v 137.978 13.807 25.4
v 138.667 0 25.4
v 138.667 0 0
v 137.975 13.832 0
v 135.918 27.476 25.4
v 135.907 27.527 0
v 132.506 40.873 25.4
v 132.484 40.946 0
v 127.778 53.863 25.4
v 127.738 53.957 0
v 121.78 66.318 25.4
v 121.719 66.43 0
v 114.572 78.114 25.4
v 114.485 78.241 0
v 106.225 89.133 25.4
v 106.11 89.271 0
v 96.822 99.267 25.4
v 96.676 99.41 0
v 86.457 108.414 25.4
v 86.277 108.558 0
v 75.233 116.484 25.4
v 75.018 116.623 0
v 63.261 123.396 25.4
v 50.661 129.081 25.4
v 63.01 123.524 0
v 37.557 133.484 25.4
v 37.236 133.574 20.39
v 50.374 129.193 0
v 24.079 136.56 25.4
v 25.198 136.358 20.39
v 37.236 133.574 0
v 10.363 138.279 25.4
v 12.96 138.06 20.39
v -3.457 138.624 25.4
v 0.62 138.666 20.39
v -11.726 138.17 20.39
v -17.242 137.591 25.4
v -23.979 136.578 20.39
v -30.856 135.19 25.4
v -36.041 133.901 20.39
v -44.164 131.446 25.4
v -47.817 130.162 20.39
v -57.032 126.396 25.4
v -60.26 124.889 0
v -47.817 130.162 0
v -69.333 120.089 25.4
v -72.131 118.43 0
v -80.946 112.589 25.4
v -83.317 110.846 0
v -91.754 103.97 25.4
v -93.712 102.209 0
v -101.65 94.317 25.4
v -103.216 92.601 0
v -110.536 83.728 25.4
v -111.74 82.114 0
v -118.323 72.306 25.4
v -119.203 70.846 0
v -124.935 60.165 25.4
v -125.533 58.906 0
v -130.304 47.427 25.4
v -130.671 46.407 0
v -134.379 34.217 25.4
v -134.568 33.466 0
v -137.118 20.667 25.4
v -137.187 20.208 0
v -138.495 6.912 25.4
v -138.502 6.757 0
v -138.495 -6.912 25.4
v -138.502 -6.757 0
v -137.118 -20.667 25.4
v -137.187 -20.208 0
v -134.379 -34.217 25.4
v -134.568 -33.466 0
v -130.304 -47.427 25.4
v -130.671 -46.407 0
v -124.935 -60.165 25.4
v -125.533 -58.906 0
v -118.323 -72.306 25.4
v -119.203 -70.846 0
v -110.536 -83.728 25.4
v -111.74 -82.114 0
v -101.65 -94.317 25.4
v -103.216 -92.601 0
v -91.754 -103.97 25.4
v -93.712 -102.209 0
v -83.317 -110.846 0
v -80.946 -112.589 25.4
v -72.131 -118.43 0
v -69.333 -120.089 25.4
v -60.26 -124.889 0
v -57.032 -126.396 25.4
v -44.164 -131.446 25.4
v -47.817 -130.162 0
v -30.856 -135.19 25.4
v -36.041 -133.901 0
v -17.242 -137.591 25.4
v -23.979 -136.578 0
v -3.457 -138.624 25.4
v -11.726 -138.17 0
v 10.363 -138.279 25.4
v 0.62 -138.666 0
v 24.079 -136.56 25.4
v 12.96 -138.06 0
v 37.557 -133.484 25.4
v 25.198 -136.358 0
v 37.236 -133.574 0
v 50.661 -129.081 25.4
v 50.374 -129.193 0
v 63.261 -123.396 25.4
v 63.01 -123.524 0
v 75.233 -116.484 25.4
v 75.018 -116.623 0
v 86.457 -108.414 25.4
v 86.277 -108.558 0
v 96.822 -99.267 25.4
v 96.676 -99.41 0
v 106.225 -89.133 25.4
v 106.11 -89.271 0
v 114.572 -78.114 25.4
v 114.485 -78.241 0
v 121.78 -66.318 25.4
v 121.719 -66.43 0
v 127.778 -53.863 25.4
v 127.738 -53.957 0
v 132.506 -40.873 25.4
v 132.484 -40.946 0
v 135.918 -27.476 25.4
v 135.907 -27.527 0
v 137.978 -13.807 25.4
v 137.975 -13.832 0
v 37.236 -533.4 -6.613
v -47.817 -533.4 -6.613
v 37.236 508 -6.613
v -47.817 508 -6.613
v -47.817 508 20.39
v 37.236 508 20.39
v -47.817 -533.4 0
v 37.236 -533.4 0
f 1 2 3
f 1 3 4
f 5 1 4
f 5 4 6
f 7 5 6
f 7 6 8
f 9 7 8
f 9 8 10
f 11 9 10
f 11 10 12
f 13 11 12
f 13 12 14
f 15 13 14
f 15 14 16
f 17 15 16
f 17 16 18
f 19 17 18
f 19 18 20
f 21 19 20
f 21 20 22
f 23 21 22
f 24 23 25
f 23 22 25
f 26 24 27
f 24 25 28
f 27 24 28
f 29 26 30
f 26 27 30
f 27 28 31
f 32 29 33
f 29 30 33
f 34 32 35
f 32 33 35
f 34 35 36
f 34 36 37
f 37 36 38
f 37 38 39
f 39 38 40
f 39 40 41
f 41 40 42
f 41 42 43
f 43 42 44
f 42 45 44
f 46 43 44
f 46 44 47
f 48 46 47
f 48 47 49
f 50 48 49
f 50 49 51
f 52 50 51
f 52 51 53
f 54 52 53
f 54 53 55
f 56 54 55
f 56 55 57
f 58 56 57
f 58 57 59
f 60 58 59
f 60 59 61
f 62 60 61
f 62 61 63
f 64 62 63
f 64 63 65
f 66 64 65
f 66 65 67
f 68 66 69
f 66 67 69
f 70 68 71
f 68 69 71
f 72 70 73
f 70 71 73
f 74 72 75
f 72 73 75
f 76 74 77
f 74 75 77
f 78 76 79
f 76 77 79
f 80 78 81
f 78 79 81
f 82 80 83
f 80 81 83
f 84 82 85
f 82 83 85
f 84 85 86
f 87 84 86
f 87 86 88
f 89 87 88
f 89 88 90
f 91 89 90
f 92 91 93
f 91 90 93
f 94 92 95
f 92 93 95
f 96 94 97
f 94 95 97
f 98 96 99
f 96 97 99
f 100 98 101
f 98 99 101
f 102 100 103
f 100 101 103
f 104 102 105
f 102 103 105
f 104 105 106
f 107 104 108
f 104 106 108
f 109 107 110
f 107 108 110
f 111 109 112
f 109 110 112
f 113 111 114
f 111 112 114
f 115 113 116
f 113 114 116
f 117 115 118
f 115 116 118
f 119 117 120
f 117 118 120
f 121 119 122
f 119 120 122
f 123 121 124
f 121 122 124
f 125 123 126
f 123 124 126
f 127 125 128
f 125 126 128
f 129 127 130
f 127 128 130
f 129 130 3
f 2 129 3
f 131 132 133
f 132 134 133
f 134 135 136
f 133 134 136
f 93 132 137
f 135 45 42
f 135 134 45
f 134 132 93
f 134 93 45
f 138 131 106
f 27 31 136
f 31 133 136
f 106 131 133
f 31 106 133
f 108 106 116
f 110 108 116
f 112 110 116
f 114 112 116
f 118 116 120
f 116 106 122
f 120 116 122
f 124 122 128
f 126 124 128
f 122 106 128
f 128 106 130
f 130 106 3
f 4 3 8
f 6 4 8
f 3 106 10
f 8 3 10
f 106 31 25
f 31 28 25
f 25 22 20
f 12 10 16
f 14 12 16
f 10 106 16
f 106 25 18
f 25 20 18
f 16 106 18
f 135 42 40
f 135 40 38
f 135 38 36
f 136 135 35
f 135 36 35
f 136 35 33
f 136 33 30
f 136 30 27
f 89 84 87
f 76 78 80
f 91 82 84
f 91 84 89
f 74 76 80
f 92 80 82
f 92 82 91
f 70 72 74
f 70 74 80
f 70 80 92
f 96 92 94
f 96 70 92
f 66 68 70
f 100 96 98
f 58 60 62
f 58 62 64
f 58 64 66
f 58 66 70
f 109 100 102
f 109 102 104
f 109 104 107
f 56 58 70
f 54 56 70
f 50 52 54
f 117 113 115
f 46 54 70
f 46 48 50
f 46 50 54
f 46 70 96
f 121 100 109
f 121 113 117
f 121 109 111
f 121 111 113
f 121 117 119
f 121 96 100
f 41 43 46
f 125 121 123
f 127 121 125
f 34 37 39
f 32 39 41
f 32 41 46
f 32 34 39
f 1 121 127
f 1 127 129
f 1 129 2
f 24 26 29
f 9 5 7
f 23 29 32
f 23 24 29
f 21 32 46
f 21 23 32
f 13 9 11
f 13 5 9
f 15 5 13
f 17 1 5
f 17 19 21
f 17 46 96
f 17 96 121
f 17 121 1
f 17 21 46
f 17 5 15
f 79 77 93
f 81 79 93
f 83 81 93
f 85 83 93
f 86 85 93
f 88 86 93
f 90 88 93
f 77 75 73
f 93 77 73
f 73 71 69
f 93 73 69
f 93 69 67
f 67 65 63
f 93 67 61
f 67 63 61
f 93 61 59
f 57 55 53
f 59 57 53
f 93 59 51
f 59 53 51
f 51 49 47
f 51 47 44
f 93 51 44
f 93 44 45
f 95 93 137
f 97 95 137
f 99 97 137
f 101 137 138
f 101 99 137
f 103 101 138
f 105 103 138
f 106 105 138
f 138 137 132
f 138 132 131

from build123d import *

# Parameters (mm, degrees)
F0_R          = 138.6669495236
F1_DEPTH      = 25.4
F2_W          = 85.052728653
F2_H          = 27.0034535788
F3_DEPTH      = 508
F3_DEPTH_BACK = 25.4
F4_DEPTH      = 508


with BuildPart() as f1:
    # F0 (on Top) → F1 (new body)
    with BuildSketch(Plane.XY):
        Circle(F0_R)
    extrude(amount=F1_DEPTH)

    # F2 (on Front) → F3 (join, two sides)
    with BuildSketch(Plane.XZ) as f3_sk:
        with Locations((-5.2903704345, 6.888640346)):
            Rectangle(F2_W, F2_H)
    extrude(amount=-F3_DEPTH)
    extrude(f3_sk.sketch, amount=F3_DEPTH_BACK)

    # F4 (add): a face of the model
    f4_faces = [f1.faces().sort_by_distance(p)[0] for p in [
        (-5.2903704345, -25.4, -3.3065432217),
    ]]
    extrude(f4_faces, amount=F4_DEPTH)


solid = f1.part
